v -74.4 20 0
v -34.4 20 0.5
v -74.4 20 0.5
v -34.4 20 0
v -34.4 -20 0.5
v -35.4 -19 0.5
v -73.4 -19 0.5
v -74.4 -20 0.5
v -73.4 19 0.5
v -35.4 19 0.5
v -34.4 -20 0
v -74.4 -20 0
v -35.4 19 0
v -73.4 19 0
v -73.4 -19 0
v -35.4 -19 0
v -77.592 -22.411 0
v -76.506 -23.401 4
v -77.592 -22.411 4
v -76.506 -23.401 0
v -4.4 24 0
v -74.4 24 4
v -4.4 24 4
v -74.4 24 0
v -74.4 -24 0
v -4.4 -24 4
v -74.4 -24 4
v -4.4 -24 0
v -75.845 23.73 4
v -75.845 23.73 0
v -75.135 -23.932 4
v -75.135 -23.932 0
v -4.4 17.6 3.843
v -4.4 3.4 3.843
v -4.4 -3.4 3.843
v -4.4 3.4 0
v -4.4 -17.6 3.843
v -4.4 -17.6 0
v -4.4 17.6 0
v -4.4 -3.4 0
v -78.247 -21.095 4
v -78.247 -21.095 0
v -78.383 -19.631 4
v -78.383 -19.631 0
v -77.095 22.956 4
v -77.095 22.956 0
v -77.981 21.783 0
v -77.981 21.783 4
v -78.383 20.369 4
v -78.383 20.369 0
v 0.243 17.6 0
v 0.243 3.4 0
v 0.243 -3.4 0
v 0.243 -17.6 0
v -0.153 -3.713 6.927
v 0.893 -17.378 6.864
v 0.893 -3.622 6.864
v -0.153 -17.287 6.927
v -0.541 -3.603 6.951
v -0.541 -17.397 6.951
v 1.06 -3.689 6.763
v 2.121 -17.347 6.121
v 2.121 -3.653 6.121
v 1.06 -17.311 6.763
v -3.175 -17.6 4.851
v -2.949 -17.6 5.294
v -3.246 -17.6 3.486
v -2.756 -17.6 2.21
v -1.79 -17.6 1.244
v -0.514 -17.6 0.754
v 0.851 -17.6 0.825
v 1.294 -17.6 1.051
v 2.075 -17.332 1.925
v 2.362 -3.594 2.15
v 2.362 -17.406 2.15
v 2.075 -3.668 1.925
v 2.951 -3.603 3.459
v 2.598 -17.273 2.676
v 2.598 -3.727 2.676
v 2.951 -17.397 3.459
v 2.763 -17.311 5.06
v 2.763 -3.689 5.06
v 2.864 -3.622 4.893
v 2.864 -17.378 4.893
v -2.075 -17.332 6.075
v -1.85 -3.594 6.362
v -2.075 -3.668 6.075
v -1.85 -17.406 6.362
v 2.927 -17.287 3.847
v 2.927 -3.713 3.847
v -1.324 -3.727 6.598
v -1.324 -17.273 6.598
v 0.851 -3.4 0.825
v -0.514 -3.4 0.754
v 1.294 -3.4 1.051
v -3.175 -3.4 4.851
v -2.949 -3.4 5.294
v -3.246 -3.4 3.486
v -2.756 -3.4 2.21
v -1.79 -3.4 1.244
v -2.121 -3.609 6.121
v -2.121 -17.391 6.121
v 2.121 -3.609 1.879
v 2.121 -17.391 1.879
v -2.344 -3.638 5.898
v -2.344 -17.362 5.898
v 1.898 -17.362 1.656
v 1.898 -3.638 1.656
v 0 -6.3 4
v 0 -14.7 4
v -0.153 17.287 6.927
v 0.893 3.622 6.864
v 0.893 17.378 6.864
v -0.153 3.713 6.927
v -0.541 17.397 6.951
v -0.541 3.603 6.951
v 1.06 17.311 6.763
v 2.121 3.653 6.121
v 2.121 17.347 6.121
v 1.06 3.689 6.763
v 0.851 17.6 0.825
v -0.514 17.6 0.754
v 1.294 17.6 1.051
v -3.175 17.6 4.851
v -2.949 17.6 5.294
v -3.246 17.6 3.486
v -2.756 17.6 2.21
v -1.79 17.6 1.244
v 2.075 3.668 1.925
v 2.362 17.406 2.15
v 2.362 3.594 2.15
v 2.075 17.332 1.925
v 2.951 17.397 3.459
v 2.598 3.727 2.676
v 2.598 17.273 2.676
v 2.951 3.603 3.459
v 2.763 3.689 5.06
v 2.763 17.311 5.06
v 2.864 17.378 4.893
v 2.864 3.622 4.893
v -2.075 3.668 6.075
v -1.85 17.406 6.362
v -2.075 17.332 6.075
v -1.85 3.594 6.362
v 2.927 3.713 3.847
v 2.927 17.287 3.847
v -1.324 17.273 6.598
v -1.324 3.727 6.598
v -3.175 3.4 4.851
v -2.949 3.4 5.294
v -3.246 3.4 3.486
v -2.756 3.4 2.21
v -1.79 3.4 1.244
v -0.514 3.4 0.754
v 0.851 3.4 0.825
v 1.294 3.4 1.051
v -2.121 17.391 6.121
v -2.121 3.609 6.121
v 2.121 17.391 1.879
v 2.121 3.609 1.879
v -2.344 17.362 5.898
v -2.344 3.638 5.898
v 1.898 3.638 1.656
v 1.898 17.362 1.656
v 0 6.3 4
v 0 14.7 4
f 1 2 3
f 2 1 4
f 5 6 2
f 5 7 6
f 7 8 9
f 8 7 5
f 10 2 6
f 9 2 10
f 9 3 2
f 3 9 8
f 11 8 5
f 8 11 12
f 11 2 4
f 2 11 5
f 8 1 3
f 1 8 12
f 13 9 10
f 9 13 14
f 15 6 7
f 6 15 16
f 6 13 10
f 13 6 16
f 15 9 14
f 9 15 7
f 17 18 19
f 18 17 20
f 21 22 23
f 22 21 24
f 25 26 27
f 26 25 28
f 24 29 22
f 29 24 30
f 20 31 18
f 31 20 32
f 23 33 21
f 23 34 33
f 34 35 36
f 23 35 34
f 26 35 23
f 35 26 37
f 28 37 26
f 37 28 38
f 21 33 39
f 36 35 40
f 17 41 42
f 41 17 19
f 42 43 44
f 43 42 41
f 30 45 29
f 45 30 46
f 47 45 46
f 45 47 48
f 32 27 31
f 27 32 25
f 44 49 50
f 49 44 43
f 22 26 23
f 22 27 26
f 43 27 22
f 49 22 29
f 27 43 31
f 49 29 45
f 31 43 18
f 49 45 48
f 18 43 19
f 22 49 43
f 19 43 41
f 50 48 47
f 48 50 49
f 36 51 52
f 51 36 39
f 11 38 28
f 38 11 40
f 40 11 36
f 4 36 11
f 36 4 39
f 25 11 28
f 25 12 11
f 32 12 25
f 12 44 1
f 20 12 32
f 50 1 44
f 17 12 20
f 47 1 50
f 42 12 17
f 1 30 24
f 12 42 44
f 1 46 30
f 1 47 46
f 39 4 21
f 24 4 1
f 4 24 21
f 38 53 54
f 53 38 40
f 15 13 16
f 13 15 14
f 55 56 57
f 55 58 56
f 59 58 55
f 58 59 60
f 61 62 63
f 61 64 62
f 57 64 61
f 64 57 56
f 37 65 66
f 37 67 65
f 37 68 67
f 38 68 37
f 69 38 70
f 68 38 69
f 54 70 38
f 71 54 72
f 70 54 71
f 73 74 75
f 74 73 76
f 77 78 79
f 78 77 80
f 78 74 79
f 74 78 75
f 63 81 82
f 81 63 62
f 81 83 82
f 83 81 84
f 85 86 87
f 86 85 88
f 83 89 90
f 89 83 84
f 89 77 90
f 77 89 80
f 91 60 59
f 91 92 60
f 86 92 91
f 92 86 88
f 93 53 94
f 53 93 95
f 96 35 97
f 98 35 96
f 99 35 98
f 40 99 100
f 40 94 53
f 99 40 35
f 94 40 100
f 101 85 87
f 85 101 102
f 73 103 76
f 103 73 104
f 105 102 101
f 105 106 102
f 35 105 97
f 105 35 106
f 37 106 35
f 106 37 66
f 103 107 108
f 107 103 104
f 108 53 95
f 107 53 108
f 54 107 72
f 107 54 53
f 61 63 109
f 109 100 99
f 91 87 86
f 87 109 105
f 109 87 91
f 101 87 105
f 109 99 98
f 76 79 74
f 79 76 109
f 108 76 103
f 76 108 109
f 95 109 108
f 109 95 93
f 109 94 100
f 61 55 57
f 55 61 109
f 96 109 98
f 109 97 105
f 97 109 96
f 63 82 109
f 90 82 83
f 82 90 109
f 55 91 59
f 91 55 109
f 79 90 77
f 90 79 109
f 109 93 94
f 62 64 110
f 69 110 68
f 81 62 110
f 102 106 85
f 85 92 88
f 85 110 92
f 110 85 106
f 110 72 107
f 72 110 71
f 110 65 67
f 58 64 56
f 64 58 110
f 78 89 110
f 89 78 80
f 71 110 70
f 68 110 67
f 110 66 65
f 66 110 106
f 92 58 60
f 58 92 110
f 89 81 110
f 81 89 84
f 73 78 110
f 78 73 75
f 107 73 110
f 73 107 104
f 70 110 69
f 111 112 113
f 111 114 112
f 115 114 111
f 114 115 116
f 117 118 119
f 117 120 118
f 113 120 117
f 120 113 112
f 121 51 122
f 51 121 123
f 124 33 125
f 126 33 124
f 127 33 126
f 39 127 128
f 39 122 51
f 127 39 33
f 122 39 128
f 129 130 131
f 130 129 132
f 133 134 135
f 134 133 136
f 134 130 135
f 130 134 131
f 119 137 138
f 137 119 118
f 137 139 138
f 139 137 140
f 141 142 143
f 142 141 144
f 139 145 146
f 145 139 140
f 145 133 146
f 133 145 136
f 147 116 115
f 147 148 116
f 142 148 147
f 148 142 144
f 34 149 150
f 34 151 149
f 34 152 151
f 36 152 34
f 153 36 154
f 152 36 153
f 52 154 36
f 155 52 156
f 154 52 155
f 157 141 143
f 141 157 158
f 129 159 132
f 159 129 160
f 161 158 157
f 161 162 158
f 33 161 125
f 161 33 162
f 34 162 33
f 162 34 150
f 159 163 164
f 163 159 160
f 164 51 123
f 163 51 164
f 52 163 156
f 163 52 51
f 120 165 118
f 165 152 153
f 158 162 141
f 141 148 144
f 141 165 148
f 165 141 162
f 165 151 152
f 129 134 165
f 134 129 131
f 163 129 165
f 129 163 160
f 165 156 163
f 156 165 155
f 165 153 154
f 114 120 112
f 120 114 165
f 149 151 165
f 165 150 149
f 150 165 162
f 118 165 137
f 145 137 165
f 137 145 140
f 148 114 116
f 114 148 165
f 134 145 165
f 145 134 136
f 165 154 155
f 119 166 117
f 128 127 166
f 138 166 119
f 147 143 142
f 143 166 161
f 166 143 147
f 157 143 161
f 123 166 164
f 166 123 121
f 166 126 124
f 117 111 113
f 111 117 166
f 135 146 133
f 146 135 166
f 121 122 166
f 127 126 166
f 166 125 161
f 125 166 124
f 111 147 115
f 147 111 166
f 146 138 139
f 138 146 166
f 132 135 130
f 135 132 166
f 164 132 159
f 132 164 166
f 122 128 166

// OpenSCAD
/*

	Use the following page to convet a high contrast image to a hieght map
	http://customizer.makerbot.com/image_surface

*/
/* [Global] */

// Load a 100x100 pixel image.(images will be stretched to fit) Simple, high contrast images work best. Make sure to click the Invert Colors checkbox!
image_file = "bird.dat"; // [image_surface:100x100]

// Where would you like the hinge in relation to your image?
hinge_placement = 1; // [1:top,2:left,3:bottom,4:right]

// What height would you like for the embossed area (mm)?
emboss_height = 1.5;

/* [Hidden] */
$fa = 6;
$fs = 1.5;
image_width = 40;
image_length = 40;
image_padding = 4;

handle_width = image_width + image_padding*2;
handle_length = 70;
handle_height = emboss_height+2.5;
nub = 3; // hinge size
tol = 0.4; // spacing between hinge pieces

assembly();

module assembly() {
    //stamp_top(90*hinge_placement);
    stamp_bottom(90*hinge_placement);   
}

module stamp_top(rot=90) {
    translate([1,0,0])
    union() {
        difference () {
            translate([handle_length + nub + tol, -handle_width/2, 0])
                rotate([0,0,90]) handle();
            translate([handle_length-image_length/2+nub+tol,0,handle_height]) 
                rotate([0,180,rot]) plate();
        }
    
        // hinge
        translate([-1,handle_width/2-2*nub,handle_height]) hinge_m();
        mirror([0,1,0]) translate([-1,handle_width/2-2*nub,handle_height]) hinge_m();
        translate([-1,-nub,handle_height]) hinge_m();
        mirror([0,1,0]) translate([-1,-nub,handle_height]) hinge_m();
    }
}

module stamp_bottom(rot=90) {
    translate([-1,0,0])
    union() {
        translate([-handle_length + image_length/2-nub-tol,0,handle_height]) 
            rotate([0,0,-rot]) plate();
        mirror([1,0,0]) translate([handle_length + nub + tol, -handle_width/2, 0]) 
            rotate([0,0,90]) handle();
        
        // hinge
        translate([1,-nub-tol,handle_height]) hinge_f();
        mirror([0,1,0]) translate([1,-nub-tol,handle_height]) hinge_f();
    }
}

module handle() {
    difference() {
        hull() {
            cube([handle_width, handle_length, handle_height]);
            translate([image_padding,0,0]) cylinder(r=image_padding, h=handle_height);
            translate([handle_width-image_padding,0,0]) cylinder(r=image_padding, h=handle_height);
        }
        guide();
    }

}

module guide() {
    translate([image_padding,0,-.5]) 
    difference() {
        cube([image_width, image_length, 1]);
        translate([1,1,-0.5]) cube([image_width-2, image_length-2, 2]);
    }
}

module hinge_m() {
    difference () {
    	rotate([0,45,0]) union(){
            translate([0,0,-nub]) cube ([nub*3,nub*2, nub*2]);
            rotate([90,0,0]) {
                translate([0,0,-2*nub]) cylinder(r=nub,h=2*nub);
    		    cylinder(r1=nub,r2=0,h=nub);
            }
    	}
        translate([-nub,-nub/2,-handle_height-nub*5]) cube([nub*5, nub*3, nub*5]);
    }
}

module hinge_f() {
    len = handle_width/2 - 3*nub - 2*tol;
    
    difference() {
        rotate([90,-45,0]) 
        difference() {
            union() {
                cylinder(r=nub, h=len);
                translate([-3*nub,-nub,0]) cube([nub*3,nub*2,len]);
            }
            translate([0,0,-0.1]) cylinder(r1=nub+tol,r2=0,h=nub);
            translate([0,0,len-nub+0.1]) cylinder(r1=0,r2=nub+tol,h=nub);
        }
        translate([-nub*4,-len-nub/2,-handle_height-nub*5]) cube([nub*5, len+nub, nub*5]);
    }
}

module plate() {
    scale([(image_width)/100,(image_length)/100,emboss_height])
        surface(file=image_file, center=true, convexity=5);
}
